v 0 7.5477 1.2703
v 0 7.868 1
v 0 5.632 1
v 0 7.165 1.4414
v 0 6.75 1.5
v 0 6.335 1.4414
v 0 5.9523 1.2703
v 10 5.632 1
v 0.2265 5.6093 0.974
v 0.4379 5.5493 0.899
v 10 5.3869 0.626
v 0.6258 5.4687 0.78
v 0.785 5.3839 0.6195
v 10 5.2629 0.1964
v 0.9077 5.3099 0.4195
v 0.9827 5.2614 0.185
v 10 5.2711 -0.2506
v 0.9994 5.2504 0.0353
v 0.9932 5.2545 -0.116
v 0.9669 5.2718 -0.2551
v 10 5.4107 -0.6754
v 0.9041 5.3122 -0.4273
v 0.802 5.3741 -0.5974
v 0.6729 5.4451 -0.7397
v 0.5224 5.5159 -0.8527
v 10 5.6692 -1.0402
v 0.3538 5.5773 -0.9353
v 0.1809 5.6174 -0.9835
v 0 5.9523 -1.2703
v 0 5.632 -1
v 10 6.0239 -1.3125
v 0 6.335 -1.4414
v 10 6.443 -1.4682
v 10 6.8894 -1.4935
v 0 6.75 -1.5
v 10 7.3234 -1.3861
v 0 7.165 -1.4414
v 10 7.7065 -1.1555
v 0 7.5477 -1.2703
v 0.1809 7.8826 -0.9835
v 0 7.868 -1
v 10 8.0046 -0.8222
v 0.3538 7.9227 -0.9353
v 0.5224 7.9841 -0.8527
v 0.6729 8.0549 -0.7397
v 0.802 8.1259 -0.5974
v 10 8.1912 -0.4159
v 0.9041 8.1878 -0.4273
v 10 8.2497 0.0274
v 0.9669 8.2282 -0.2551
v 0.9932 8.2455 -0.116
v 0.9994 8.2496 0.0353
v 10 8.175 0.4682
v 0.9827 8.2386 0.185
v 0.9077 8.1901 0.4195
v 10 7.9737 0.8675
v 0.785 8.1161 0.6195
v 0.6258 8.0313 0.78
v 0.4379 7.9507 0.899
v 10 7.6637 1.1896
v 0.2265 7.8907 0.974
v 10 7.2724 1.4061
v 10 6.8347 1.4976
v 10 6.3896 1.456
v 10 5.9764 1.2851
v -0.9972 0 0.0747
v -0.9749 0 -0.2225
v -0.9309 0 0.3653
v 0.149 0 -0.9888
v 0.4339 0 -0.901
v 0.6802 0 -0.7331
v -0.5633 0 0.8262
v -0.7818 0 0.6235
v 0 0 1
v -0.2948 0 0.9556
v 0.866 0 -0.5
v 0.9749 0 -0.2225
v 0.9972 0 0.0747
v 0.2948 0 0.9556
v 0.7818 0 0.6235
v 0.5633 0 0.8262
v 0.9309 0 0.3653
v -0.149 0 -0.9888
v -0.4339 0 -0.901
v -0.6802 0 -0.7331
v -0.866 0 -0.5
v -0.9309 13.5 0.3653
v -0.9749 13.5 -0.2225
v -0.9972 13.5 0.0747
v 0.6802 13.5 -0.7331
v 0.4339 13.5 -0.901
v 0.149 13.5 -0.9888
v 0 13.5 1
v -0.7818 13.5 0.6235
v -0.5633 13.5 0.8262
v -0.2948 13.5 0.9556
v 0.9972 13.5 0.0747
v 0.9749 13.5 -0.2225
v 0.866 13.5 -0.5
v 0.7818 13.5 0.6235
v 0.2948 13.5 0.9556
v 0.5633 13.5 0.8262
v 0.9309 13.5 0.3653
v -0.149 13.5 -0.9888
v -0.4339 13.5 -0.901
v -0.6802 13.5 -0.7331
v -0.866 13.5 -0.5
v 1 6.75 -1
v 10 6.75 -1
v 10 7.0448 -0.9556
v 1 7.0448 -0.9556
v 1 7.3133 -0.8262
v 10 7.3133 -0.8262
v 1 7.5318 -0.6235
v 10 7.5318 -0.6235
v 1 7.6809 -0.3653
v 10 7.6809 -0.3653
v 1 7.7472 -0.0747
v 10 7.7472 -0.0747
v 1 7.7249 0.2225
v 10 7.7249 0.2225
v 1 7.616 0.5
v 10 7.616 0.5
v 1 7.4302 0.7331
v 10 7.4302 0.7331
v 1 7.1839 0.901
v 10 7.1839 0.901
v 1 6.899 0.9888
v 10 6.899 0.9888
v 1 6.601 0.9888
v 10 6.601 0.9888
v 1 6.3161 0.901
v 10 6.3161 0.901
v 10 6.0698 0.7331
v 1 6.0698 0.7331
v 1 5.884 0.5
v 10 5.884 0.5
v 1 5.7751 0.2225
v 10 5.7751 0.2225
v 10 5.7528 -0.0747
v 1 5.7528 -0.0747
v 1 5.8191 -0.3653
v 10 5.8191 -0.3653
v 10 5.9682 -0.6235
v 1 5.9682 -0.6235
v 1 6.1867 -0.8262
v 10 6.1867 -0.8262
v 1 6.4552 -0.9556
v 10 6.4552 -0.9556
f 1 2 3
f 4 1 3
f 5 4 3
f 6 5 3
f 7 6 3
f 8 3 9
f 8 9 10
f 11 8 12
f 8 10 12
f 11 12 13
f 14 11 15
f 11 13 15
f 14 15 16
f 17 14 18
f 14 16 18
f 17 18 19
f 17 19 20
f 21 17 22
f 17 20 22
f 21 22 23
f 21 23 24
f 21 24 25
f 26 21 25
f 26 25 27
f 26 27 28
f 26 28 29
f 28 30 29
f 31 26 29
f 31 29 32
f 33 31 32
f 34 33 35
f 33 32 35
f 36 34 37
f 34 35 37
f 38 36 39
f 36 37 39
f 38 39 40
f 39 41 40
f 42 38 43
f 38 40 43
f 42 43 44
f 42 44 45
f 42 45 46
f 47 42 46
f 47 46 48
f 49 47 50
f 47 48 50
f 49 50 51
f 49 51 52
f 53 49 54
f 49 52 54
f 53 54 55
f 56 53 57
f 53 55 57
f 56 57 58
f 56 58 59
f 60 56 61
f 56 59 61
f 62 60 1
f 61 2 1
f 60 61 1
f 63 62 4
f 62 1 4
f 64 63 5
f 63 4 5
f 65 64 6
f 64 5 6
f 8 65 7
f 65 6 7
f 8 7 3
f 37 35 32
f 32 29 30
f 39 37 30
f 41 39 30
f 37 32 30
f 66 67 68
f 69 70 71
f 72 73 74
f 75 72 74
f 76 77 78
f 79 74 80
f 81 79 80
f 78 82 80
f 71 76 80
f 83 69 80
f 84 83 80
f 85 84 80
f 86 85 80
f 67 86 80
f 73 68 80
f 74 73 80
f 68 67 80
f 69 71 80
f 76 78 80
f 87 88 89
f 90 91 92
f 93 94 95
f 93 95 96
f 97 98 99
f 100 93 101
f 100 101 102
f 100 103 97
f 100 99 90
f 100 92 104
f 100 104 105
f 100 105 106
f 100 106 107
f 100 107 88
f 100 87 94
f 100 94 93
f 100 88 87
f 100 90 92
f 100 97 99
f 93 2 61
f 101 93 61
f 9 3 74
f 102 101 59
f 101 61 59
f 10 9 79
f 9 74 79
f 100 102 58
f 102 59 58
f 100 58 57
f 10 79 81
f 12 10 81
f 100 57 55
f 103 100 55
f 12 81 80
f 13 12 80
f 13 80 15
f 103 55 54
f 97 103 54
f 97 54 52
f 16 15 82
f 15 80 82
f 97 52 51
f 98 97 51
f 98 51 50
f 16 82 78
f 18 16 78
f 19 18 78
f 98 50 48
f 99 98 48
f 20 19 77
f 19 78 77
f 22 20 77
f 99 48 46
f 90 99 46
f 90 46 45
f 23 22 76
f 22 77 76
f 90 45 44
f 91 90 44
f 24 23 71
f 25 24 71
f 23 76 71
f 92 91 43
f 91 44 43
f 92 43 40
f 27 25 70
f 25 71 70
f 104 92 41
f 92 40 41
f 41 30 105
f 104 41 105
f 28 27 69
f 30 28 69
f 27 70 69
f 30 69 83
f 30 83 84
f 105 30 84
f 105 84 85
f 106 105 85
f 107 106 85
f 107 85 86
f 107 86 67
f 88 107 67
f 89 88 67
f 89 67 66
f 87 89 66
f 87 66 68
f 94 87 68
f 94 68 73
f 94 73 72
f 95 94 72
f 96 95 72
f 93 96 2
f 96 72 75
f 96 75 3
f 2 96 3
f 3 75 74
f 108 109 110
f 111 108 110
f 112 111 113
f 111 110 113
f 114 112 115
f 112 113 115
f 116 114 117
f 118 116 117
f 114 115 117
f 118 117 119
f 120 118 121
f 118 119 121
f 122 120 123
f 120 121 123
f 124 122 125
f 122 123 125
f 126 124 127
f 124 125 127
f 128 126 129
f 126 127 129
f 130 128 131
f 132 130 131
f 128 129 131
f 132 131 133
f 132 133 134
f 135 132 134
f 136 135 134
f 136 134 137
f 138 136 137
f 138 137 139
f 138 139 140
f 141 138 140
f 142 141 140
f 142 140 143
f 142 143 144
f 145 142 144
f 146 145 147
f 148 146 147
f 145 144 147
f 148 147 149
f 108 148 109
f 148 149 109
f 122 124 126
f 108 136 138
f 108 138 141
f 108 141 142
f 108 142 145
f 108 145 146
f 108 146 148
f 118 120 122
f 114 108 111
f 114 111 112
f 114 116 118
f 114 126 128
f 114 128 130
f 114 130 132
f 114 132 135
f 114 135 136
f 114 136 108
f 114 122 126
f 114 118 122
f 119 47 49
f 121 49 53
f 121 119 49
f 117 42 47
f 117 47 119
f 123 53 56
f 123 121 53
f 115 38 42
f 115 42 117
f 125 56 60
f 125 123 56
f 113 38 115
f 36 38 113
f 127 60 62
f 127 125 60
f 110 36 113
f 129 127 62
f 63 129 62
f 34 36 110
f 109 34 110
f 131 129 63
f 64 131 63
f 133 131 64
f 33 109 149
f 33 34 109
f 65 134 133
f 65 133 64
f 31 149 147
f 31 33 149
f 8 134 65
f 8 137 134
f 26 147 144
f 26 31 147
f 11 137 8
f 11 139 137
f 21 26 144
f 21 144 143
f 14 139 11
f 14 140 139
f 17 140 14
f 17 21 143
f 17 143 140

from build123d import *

# Parameters (mm, degrees)
SKETCH_1_R           = 1
EXTRUDE_1_DEPTH      = 13.5
SKETCH_4_R           = 1.5
EXTRUDE_3_DEPTH      = 10
SKETCH_7_R           = 1
CUT_EXTRUDE_15_DEPTH = 9


with BuildPart() as part:
    # 草图1 → 凸台-拉伸1 (new body)
    with BuildSketch(Plane(origin=(0, 0, 0), x_dir=(1, 0, 0), z_dir=(0, 1, 0))):
        Circle(SKETCH_1_R)
    extrude(amount=EXTRUDE_1_DEPTH)

    # 草图4 → 凸台-拉伸3 (add)
    with BuildSketch(Plane(origin=(0, 0, 0), x_dir=(0, 0, -1), z_dir=(1, 0, 0))):
        with Locations((0, 6.75)):
            Circle(SKETCH_4_R)
    extrude(amount=EXTRUDE_3_DEPTH)

    # 草图7 → 切除-拉伸15 (cut)
    with BuildSketch(Plane(origin=(10, 0, 0), x_dir=(0, 0, -1), z_dir=(1, 0, 0))):
        with Locations((0, 6.75)):
            Circle(SKETCH_7_R)
    extrude(amount=-CUT_EXTRUDE_15_DEPTH, mode=Mode.SUBTRACT)


solid = part.part
